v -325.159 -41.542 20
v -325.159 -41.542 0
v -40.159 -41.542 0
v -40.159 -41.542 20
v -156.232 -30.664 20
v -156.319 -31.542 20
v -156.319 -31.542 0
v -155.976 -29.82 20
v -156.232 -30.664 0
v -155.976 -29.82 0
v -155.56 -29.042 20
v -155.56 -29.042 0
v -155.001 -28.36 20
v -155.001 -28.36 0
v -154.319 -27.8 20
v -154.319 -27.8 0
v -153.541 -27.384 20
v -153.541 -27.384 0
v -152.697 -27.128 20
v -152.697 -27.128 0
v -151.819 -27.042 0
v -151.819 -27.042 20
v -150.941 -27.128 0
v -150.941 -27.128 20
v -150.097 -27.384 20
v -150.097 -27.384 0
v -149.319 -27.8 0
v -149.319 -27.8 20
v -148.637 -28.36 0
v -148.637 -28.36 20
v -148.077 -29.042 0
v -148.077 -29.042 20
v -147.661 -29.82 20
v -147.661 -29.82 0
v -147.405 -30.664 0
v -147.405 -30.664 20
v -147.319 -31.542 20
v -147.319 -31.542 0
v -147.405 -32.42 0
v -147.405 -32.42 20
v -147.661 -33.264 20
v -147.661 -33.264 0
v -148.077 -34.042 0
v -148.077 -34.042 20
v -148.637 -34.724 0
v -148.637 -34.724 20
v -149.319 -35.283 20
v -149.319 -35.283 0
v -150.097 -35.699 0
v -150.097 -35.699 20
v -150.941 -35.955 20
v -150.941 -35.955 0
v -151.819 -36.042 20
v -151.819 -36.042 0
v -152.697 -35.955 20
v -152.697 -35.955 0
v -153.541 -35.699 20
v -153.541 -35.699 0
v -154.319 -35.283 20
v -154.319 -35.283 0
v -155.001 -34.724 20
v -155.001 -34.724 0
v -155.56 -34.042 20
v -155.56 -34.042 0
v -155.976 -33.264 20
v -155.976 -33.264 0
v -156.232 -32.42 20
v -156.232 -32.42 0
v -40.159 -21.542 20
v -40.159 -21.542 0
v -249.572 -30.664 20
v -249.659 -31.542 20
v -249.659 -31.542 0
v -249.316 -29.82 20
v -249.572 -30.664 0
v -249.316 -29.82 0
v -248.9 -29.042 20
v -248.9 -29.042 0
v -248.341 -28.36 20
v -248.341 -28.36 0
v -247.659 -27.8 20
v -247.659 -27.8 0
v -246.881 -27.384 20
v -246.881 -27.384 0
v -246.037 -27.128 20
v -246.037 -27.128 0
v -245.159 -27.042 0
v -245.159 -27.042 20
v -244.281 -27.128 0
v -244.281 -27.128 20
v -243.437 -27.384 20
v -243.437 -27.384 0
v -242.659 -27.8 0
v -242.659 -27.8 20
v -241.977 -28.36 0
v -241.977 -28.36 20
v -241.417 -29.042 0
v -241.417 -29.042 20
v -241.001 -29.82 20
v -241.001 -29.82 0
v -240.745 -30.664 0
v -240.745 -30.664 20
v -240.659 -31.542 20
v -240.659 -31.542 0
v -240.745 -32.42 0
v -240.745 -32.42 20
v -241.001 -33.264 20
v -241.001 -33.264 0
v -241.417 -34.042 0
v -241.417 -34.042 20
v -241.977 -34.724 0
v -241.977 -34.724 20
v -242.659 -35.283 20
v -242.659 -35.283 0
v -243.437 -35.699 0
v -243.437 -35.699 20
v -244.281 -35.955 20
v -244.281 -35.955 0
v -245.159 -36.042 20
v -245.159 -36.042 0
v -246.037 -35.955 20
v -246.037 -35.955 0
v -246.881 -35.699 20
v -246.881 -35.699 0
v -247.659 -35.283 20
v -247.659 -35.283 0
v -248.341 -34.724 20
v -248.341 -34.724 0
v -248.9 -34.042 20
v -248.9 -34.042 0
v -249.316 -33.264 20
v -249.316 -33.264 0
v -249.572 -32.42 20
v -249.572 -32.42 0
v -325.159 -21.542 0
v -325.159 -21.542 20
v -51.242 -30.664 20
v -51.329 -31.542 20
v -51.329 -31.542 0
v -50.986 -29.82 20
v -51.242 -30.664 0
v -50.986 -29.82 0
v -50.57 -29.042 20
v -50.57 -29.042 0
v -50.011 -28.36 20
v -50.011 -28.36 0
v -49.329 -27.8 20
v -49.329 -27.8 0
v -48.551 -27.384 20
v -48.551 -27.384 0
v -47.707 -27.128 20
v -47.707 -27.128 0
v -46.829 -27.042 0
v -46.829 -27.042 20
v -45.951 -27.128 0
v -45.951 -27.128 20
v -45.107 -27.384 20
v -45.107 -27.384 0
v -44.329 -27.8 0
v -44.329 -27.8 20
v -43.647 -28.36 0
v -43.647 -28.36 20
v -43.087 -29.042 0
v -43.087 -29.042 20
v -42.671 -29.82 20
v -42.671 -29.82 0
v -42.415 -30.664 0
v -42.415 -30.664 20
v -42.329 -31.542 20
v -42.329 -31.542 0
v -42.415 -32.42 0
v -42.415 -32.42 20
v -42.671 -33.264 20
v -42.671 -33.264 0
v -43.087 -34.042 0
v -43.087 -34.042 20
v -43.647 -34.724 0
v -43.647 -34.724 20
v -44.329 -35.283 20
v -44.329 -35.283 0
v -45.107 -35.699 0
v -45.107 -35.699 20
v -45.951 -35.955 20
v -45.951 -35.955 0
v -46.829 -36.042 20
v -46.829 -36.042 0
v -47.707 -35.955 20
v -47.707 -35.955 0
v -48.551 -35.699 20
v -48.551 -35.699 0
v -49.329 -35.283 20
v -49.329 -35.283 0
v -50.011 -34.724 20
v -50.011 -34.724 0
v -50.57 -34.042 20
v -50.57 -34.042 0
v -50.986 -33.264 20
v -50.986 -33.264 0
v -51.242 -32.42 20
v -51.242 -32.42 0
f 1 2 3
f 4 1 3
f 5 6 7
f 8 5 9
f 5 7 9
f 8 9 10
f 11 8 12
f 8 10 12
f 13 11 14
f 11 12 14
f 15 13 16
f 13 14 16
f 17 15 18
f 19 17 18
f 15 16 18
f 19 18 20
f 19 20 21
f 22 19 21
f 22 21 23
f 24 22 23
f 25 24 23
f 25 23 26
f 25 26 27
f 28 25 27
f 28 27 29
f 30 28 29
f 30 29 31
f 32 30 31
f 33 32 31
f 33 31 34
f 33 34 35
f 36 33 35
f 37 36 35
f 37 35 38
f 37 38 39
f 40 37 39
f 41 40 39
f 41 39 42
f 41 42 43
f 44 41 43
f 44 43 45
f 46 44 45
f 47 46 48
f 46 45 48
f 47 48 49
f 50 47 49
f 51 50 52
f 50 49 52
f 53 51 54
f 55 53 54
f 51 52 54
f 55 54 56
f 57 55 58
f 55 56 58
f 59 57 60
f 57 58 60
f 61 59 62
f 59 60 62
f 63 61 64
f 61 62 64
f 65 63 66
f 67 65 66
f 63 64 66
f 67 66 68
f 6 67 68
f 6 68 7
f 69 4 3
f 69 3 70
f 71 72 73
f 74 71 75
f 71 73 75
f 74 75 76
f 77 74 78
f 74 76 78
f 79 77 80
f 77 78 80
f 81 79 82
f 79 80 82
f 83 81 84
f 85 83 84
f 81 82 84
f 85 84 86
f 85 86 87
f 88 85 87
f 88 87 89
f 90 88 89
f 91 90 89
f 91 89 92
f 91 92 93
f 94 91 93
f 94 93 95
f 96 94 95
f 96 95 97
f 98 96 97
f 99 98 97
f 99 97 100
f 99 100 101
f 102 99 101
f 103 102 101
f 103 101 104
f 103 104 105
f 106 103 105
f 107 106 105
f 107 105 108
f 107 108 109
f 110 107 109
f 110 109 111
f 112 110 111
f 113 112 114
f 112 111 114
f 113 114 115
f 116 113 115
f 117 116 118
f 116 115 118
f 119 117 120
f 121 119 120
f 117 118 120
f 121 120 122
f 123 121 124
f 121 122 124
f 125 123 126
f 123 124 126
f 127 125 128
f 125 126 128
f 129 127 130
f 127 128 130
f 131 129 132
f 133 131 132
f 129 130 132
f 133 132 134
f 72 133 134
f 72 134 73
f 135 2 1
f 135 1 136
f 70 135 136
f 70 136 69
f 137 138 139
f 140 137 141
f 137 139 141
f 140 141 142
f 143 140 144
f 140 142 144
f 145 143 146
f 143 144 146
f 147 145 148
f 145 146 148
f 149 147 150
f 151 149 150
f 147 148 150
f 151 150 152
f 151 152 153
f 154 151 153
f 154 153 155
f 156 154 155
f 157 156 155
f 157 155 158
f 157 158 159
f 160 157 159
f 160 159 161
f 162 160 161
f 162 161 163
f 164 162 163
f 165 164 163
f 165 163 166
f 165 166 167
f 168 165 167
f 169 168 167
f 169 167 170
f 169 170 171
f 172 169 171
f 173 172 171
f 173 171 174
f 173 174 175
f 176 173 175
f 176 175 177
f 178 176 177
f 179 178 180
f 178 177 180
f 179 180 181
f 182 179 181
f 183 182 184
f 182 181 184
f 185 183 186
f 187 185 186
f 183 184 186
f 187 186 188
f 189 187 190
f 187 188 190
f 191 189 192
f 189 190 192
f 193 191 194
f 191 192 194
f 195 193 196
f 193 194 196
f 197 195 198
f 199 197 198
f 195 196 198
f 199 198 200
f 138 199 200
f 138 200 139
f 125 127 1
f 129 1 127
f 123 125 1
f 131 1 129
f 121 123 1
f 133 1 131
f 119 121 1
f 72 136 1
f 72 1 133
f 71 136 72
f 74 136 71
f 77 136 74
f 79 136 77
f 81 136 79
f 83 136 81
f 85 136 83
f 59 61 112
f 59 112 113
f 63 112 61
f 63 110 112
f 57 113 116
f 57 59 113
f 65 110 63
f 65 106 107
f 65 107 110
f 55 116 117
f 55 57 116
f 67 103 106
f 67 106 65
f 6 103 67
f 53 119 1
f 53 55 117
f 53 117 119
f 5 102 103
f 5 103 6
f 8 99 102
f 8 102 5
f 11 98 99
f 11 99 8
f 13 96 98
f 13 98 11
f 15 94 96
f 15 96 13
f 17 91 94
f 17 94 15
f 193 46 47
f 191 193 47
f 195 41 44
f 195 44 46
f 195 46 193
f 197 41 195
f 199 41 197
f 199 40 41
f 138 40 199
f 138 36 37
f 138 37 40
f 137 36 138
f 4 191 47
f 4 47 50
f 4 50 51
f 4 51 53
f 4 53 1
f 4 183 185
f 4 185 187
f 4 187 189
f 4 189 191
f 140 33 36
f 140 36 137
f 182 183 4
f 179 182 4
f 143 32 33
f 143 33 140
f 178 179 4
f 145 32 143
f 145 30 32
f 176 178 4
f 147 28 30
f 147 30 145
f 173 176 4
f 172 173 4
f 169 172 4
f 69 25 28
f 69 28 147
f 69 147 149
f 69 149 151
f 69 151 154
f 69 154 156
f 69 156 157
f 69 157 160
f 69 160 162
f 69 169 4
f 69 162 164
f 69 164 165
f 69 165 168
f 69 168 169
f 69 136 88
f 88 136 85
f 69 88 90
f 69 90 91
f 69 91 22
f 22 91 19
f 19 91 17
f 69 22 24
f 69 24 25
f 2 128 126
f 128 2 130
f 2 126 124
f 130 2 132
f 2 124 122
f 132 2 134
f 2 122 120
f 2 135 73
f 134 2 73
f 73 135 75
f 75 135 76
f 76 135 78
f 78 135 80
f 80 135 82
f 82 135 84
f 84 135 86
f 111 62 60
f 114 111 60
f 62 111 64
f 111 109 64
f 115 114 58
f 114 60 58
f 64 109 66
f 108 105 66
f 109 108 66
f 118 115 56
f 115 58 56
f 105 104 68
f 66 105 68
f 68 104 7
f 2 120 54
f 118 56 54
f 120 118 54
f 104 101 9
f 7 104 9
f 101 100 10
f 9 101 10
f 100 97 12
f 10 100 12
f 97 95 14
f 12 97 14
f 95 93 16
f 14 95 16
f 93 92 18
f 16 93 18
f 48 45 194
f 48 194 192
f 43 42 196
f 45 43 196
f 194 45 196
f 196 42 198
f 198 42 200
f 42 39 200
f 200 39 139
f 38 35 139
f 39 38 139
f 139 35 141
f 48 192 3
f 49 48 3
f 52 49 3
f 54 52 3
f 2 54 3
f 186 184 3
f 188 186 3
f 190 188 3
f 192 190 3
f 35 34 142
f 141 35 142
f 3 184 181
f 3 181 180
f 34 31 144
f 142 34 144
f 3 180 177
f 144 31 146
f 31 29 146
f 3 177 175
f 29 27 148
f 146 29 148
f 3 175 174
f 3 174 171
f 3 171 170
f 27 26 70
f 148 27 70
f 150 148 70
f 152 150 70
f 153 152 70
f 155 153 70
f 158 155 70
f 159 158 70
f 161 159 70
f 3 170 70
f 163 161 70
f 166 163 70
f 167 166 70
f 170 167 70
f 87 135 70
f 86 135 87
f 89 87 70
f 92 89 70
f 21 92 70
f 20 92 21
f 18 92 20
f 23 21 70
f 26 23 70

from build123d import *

# Parameters (mm, degrees)
F0_W     = 650
F0_H     = 20
F1_DEPTH = 20
F3_D     = 9
F4_W     = 365
F4_H     = 20
F4_R     = 4.5
F5_DEPTH = 25


with BuildPart() as f1:
    # F0 (on Top) → F1 (new body)
    with BuildSketch(Plane.XY):
        with Locations((-0.1587718725, -31.5417255368)):
            Rectangle(F0_W, F0_H)
    extrude(amount=F1_DEPTH)

    # F3 (through all)
    with Locations(Plane.XY.offset(20)):
        with Locations((-245.1587718725, -31.5417255368), (-151.8187718725, -31.5417255368), (-46.8287718725, -31.5417255368), (46.5112281275, -31.5417255368)):
            Hole(F3_D / 2)

    # F4 (on face) → F5 (cut)
    with BuildSketch(Plane.XY.offset(20)):
        with Locations((142.3412281275, -31.5417255368)):
            Rectangle(F4_W, F4_H)
        with Locations((46.5112281275, -31.5417255368)):
            Circle(F4_R, mode=Mode.SUBTRACT)
    extrude(amount=-F5_DEPTH, mode=Mode.SUBTRACT)


solid = f1.part
